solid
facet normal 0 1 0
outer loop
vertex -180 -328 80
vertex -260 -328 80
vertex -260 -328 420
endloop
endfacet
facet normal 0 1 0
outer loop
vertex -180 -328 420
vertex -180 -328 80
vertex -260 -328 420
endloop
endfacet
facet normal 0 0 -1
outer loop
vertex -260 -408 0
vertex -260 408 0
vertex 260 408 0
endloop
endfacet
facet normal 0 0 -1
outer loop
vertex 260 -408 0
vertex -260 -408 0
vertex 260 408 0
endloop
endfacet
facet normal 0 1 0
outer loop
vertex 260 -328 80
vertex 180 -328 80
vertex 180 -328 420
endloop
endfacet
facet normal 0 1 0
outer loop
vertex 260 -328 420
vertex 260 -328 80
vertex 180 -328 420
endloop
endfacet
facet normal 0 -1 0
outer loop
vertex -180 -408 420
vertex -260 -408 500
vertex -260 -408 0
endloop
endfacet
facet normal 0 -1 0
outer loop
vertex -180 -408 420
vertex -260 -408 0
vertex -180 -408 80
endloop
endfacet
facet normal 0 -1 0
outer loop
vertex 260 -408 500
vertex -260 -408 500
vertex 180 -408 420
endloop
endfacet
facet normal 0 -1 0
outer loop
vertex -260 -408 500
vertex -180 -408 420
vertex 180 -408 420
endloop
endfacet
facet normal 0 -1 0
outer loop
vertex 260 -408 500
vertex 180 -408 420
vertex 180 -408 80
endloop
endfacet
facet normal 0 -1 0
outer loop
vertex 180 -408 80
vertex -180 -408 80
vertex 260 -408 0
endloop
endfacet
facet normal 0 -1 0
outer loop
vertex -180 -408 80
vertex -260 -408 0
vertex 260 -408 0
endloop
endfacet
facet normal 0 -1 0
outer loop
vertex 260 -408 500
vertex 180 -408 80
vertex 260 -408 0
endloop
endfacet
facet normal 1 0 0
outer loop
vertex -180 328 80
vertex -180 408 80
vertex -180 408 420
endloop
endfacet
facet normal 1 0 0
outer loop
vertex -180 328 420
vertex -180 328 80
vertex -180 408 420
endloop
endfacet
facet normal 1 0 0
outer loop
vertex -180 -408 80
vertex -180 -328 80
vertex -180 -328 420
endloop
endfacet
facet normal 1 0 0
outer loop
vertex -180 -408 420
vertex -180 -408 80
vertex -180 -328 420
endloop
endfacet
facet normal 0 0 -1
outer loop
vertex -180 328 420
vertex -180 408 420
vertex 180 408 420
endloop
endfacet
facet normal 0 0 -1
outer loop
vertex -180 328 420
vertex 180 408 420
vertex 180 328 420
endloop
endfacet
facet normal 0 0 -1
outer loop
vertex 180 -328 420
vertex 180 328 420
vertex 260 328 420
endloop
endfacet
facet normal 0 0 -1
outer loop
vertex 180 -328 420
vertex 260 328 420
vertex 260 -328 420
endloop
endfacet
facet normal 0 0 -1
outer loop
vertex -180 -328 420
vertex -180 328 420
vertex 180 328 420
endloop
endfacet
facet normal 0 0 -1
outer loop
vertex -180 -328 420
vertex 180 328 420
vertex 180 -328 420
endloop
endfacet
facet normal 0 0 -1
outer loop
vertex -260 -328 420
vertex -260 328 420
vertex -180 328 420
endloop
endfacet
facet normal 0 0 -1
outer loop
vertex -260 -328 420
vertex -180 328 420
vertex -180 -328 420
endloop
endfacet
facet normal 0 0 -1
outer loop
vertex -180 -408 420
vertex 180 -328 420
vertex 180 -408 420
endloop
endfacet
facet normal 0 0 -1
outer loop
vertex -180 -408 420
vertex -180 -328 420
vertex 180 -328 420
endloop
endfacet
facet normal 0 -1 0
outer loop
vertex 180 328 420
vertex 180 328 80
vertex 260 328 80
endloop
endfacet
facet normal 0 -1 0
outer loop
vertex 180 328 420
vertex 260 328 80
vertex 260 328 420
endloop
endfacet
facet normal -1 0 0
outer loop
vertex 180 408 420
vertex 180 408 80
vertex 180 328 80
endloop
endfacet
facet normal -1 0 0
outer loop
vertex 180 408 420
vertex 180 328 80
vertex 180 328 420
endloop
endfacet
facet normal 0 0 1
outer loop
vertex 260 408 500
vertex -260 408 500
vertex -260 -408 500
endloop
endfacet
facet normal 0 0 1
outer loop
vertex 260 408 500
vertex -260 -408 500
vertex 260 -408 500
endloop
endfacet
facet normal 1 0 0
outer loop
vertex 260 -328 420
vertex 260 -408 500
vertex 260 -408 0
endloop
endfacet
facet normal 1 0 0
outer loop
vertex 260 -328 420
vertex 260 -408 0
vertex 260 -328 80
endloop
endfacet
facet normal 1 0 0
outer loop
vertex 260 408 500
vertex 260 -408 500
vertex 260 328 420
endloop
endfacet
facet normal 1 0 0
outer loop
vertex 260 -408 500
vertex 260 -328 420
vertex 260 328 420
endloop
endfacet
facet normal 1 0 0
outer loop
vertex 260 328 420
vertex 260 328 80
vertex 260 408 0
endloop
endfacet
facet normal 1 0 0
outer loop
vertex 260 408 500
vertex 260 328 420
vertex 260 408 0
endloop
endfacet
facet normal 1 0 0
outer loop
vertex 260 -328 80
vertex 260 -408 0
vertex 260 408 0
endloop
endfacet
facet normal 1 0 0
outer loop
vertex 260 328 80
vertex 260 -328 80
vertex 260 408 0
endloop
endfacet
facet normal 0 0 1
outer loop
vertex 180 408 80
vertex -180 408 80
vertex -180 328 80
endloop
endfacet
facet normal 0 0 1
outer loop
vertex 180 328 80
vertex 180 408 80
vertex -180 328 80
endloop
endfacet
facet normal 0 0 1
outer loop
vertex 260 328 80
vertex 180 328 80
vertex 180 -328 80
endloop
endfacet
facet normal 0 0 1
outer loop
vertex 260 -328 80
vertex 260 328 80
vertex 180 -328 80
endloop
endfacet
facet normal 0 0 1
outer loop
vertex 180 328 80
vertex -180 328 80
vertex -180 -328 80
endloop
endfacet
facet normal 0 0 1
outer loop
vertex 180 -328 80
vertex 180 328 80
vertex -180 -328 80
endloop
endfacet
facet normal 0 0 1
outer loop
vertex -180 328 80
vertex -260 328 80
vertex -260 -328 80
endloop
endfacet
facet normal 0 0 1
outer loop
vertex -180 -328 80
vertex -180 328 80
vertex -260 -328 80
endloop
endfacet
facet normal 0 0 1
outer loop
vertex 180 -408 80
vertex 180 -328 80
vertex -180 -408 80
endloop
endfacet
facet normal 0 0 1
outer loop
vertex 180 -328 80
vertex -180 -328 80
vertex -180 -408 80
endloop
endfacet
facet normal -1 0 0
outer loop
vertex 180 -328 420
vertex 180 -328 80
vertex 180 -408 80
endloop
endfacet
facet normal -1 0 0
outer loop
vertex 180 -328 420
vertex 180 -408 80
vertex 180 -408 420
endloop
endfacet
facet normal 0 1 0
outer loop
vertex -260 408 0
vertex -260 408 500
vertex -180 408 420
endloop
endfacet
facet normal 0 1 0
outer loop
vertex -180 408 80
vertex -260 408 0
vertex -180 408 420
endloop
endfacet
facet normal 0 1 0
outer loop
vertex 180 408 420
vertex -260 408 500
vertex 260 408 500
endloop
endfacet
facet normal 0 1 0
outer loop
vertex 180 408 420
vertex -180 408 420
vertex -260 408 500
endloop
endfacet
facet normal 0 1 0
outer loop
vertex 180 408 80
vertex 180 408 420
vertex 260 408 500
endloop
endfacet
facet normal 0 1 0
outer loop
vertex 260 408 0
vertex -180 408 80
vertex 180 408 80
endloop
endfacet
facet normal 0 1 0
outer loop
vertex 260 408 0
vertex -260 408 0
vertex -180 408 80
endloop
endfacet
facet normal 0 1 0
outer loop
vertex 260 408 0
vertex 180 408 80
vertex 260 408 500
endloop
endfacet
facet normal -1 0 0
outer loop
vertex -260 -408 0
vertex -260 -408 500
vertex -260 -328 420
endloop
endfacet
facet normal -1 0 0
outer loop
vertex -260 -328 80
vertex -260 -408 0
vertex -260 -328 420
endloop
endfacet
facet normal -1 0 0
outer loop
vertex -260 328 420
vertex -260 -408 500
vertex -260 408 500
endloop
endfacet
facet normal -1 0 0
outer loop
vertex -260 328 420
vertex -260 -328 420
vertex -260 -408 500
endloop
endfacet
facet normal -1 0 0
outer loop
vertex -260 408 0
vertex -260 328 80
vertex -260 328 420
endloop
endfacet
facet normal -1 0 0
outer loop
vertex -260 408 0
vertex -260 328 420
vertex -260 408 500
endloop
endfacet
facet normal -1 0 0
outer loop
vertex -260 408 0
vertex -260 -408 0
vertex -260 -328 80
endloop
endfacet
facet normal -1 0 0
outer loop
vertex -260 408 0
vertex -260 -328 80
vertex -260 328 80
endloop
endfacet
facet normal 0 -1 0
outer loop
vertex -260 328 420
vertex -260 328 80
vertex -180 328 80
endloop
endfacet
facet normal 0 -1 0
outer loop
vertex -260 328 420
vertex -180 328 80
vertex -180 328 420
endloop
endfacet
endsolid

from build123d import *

# Parameters (mm, degrees)
F0_W     = 520
F0_H     = 816
F1_DEPTH = 500
F2_W     = 360
F2_H     = 340
F3_DEPTH = 816.001
F4_W     = 656
F4_H     = 340
F5_DEPTH = 520.001


with BuildPart() as f1:
    # F0 (on Top) → F1 (new body)
    with BuildSketch(Plane.XY):
        Rectangle(F0_W, F0_H)
    extrude(amount=F1_DEPTH)

    # F2 (on face) → F3 (cut, through all)
    with BuildSketch(Plane(origin=(0, 408, 0), x_dir=(-1, 0, 0), z_dir=(0, 1, 0))):
        with Locations((0, 250)):
            Rectangle(F2_W, F2_H)
    extrude(amount=-F3_DEPTH, mode=Mode.SUBTRACT)

    # F4 (on face) → F5 (cut, through all)
    with BuildSketch(Plane(origin=(-260, 0, 0), x_dir=(0, -1, 0), z_dir=(-1, 0, 0))):
        with Locations((0, 250)):
            Rectangle(F4_W, F4_H)
    extrude(amount=-F5_DEPTH, mode=Mode.SUBTRACT)


solid = f1.part
